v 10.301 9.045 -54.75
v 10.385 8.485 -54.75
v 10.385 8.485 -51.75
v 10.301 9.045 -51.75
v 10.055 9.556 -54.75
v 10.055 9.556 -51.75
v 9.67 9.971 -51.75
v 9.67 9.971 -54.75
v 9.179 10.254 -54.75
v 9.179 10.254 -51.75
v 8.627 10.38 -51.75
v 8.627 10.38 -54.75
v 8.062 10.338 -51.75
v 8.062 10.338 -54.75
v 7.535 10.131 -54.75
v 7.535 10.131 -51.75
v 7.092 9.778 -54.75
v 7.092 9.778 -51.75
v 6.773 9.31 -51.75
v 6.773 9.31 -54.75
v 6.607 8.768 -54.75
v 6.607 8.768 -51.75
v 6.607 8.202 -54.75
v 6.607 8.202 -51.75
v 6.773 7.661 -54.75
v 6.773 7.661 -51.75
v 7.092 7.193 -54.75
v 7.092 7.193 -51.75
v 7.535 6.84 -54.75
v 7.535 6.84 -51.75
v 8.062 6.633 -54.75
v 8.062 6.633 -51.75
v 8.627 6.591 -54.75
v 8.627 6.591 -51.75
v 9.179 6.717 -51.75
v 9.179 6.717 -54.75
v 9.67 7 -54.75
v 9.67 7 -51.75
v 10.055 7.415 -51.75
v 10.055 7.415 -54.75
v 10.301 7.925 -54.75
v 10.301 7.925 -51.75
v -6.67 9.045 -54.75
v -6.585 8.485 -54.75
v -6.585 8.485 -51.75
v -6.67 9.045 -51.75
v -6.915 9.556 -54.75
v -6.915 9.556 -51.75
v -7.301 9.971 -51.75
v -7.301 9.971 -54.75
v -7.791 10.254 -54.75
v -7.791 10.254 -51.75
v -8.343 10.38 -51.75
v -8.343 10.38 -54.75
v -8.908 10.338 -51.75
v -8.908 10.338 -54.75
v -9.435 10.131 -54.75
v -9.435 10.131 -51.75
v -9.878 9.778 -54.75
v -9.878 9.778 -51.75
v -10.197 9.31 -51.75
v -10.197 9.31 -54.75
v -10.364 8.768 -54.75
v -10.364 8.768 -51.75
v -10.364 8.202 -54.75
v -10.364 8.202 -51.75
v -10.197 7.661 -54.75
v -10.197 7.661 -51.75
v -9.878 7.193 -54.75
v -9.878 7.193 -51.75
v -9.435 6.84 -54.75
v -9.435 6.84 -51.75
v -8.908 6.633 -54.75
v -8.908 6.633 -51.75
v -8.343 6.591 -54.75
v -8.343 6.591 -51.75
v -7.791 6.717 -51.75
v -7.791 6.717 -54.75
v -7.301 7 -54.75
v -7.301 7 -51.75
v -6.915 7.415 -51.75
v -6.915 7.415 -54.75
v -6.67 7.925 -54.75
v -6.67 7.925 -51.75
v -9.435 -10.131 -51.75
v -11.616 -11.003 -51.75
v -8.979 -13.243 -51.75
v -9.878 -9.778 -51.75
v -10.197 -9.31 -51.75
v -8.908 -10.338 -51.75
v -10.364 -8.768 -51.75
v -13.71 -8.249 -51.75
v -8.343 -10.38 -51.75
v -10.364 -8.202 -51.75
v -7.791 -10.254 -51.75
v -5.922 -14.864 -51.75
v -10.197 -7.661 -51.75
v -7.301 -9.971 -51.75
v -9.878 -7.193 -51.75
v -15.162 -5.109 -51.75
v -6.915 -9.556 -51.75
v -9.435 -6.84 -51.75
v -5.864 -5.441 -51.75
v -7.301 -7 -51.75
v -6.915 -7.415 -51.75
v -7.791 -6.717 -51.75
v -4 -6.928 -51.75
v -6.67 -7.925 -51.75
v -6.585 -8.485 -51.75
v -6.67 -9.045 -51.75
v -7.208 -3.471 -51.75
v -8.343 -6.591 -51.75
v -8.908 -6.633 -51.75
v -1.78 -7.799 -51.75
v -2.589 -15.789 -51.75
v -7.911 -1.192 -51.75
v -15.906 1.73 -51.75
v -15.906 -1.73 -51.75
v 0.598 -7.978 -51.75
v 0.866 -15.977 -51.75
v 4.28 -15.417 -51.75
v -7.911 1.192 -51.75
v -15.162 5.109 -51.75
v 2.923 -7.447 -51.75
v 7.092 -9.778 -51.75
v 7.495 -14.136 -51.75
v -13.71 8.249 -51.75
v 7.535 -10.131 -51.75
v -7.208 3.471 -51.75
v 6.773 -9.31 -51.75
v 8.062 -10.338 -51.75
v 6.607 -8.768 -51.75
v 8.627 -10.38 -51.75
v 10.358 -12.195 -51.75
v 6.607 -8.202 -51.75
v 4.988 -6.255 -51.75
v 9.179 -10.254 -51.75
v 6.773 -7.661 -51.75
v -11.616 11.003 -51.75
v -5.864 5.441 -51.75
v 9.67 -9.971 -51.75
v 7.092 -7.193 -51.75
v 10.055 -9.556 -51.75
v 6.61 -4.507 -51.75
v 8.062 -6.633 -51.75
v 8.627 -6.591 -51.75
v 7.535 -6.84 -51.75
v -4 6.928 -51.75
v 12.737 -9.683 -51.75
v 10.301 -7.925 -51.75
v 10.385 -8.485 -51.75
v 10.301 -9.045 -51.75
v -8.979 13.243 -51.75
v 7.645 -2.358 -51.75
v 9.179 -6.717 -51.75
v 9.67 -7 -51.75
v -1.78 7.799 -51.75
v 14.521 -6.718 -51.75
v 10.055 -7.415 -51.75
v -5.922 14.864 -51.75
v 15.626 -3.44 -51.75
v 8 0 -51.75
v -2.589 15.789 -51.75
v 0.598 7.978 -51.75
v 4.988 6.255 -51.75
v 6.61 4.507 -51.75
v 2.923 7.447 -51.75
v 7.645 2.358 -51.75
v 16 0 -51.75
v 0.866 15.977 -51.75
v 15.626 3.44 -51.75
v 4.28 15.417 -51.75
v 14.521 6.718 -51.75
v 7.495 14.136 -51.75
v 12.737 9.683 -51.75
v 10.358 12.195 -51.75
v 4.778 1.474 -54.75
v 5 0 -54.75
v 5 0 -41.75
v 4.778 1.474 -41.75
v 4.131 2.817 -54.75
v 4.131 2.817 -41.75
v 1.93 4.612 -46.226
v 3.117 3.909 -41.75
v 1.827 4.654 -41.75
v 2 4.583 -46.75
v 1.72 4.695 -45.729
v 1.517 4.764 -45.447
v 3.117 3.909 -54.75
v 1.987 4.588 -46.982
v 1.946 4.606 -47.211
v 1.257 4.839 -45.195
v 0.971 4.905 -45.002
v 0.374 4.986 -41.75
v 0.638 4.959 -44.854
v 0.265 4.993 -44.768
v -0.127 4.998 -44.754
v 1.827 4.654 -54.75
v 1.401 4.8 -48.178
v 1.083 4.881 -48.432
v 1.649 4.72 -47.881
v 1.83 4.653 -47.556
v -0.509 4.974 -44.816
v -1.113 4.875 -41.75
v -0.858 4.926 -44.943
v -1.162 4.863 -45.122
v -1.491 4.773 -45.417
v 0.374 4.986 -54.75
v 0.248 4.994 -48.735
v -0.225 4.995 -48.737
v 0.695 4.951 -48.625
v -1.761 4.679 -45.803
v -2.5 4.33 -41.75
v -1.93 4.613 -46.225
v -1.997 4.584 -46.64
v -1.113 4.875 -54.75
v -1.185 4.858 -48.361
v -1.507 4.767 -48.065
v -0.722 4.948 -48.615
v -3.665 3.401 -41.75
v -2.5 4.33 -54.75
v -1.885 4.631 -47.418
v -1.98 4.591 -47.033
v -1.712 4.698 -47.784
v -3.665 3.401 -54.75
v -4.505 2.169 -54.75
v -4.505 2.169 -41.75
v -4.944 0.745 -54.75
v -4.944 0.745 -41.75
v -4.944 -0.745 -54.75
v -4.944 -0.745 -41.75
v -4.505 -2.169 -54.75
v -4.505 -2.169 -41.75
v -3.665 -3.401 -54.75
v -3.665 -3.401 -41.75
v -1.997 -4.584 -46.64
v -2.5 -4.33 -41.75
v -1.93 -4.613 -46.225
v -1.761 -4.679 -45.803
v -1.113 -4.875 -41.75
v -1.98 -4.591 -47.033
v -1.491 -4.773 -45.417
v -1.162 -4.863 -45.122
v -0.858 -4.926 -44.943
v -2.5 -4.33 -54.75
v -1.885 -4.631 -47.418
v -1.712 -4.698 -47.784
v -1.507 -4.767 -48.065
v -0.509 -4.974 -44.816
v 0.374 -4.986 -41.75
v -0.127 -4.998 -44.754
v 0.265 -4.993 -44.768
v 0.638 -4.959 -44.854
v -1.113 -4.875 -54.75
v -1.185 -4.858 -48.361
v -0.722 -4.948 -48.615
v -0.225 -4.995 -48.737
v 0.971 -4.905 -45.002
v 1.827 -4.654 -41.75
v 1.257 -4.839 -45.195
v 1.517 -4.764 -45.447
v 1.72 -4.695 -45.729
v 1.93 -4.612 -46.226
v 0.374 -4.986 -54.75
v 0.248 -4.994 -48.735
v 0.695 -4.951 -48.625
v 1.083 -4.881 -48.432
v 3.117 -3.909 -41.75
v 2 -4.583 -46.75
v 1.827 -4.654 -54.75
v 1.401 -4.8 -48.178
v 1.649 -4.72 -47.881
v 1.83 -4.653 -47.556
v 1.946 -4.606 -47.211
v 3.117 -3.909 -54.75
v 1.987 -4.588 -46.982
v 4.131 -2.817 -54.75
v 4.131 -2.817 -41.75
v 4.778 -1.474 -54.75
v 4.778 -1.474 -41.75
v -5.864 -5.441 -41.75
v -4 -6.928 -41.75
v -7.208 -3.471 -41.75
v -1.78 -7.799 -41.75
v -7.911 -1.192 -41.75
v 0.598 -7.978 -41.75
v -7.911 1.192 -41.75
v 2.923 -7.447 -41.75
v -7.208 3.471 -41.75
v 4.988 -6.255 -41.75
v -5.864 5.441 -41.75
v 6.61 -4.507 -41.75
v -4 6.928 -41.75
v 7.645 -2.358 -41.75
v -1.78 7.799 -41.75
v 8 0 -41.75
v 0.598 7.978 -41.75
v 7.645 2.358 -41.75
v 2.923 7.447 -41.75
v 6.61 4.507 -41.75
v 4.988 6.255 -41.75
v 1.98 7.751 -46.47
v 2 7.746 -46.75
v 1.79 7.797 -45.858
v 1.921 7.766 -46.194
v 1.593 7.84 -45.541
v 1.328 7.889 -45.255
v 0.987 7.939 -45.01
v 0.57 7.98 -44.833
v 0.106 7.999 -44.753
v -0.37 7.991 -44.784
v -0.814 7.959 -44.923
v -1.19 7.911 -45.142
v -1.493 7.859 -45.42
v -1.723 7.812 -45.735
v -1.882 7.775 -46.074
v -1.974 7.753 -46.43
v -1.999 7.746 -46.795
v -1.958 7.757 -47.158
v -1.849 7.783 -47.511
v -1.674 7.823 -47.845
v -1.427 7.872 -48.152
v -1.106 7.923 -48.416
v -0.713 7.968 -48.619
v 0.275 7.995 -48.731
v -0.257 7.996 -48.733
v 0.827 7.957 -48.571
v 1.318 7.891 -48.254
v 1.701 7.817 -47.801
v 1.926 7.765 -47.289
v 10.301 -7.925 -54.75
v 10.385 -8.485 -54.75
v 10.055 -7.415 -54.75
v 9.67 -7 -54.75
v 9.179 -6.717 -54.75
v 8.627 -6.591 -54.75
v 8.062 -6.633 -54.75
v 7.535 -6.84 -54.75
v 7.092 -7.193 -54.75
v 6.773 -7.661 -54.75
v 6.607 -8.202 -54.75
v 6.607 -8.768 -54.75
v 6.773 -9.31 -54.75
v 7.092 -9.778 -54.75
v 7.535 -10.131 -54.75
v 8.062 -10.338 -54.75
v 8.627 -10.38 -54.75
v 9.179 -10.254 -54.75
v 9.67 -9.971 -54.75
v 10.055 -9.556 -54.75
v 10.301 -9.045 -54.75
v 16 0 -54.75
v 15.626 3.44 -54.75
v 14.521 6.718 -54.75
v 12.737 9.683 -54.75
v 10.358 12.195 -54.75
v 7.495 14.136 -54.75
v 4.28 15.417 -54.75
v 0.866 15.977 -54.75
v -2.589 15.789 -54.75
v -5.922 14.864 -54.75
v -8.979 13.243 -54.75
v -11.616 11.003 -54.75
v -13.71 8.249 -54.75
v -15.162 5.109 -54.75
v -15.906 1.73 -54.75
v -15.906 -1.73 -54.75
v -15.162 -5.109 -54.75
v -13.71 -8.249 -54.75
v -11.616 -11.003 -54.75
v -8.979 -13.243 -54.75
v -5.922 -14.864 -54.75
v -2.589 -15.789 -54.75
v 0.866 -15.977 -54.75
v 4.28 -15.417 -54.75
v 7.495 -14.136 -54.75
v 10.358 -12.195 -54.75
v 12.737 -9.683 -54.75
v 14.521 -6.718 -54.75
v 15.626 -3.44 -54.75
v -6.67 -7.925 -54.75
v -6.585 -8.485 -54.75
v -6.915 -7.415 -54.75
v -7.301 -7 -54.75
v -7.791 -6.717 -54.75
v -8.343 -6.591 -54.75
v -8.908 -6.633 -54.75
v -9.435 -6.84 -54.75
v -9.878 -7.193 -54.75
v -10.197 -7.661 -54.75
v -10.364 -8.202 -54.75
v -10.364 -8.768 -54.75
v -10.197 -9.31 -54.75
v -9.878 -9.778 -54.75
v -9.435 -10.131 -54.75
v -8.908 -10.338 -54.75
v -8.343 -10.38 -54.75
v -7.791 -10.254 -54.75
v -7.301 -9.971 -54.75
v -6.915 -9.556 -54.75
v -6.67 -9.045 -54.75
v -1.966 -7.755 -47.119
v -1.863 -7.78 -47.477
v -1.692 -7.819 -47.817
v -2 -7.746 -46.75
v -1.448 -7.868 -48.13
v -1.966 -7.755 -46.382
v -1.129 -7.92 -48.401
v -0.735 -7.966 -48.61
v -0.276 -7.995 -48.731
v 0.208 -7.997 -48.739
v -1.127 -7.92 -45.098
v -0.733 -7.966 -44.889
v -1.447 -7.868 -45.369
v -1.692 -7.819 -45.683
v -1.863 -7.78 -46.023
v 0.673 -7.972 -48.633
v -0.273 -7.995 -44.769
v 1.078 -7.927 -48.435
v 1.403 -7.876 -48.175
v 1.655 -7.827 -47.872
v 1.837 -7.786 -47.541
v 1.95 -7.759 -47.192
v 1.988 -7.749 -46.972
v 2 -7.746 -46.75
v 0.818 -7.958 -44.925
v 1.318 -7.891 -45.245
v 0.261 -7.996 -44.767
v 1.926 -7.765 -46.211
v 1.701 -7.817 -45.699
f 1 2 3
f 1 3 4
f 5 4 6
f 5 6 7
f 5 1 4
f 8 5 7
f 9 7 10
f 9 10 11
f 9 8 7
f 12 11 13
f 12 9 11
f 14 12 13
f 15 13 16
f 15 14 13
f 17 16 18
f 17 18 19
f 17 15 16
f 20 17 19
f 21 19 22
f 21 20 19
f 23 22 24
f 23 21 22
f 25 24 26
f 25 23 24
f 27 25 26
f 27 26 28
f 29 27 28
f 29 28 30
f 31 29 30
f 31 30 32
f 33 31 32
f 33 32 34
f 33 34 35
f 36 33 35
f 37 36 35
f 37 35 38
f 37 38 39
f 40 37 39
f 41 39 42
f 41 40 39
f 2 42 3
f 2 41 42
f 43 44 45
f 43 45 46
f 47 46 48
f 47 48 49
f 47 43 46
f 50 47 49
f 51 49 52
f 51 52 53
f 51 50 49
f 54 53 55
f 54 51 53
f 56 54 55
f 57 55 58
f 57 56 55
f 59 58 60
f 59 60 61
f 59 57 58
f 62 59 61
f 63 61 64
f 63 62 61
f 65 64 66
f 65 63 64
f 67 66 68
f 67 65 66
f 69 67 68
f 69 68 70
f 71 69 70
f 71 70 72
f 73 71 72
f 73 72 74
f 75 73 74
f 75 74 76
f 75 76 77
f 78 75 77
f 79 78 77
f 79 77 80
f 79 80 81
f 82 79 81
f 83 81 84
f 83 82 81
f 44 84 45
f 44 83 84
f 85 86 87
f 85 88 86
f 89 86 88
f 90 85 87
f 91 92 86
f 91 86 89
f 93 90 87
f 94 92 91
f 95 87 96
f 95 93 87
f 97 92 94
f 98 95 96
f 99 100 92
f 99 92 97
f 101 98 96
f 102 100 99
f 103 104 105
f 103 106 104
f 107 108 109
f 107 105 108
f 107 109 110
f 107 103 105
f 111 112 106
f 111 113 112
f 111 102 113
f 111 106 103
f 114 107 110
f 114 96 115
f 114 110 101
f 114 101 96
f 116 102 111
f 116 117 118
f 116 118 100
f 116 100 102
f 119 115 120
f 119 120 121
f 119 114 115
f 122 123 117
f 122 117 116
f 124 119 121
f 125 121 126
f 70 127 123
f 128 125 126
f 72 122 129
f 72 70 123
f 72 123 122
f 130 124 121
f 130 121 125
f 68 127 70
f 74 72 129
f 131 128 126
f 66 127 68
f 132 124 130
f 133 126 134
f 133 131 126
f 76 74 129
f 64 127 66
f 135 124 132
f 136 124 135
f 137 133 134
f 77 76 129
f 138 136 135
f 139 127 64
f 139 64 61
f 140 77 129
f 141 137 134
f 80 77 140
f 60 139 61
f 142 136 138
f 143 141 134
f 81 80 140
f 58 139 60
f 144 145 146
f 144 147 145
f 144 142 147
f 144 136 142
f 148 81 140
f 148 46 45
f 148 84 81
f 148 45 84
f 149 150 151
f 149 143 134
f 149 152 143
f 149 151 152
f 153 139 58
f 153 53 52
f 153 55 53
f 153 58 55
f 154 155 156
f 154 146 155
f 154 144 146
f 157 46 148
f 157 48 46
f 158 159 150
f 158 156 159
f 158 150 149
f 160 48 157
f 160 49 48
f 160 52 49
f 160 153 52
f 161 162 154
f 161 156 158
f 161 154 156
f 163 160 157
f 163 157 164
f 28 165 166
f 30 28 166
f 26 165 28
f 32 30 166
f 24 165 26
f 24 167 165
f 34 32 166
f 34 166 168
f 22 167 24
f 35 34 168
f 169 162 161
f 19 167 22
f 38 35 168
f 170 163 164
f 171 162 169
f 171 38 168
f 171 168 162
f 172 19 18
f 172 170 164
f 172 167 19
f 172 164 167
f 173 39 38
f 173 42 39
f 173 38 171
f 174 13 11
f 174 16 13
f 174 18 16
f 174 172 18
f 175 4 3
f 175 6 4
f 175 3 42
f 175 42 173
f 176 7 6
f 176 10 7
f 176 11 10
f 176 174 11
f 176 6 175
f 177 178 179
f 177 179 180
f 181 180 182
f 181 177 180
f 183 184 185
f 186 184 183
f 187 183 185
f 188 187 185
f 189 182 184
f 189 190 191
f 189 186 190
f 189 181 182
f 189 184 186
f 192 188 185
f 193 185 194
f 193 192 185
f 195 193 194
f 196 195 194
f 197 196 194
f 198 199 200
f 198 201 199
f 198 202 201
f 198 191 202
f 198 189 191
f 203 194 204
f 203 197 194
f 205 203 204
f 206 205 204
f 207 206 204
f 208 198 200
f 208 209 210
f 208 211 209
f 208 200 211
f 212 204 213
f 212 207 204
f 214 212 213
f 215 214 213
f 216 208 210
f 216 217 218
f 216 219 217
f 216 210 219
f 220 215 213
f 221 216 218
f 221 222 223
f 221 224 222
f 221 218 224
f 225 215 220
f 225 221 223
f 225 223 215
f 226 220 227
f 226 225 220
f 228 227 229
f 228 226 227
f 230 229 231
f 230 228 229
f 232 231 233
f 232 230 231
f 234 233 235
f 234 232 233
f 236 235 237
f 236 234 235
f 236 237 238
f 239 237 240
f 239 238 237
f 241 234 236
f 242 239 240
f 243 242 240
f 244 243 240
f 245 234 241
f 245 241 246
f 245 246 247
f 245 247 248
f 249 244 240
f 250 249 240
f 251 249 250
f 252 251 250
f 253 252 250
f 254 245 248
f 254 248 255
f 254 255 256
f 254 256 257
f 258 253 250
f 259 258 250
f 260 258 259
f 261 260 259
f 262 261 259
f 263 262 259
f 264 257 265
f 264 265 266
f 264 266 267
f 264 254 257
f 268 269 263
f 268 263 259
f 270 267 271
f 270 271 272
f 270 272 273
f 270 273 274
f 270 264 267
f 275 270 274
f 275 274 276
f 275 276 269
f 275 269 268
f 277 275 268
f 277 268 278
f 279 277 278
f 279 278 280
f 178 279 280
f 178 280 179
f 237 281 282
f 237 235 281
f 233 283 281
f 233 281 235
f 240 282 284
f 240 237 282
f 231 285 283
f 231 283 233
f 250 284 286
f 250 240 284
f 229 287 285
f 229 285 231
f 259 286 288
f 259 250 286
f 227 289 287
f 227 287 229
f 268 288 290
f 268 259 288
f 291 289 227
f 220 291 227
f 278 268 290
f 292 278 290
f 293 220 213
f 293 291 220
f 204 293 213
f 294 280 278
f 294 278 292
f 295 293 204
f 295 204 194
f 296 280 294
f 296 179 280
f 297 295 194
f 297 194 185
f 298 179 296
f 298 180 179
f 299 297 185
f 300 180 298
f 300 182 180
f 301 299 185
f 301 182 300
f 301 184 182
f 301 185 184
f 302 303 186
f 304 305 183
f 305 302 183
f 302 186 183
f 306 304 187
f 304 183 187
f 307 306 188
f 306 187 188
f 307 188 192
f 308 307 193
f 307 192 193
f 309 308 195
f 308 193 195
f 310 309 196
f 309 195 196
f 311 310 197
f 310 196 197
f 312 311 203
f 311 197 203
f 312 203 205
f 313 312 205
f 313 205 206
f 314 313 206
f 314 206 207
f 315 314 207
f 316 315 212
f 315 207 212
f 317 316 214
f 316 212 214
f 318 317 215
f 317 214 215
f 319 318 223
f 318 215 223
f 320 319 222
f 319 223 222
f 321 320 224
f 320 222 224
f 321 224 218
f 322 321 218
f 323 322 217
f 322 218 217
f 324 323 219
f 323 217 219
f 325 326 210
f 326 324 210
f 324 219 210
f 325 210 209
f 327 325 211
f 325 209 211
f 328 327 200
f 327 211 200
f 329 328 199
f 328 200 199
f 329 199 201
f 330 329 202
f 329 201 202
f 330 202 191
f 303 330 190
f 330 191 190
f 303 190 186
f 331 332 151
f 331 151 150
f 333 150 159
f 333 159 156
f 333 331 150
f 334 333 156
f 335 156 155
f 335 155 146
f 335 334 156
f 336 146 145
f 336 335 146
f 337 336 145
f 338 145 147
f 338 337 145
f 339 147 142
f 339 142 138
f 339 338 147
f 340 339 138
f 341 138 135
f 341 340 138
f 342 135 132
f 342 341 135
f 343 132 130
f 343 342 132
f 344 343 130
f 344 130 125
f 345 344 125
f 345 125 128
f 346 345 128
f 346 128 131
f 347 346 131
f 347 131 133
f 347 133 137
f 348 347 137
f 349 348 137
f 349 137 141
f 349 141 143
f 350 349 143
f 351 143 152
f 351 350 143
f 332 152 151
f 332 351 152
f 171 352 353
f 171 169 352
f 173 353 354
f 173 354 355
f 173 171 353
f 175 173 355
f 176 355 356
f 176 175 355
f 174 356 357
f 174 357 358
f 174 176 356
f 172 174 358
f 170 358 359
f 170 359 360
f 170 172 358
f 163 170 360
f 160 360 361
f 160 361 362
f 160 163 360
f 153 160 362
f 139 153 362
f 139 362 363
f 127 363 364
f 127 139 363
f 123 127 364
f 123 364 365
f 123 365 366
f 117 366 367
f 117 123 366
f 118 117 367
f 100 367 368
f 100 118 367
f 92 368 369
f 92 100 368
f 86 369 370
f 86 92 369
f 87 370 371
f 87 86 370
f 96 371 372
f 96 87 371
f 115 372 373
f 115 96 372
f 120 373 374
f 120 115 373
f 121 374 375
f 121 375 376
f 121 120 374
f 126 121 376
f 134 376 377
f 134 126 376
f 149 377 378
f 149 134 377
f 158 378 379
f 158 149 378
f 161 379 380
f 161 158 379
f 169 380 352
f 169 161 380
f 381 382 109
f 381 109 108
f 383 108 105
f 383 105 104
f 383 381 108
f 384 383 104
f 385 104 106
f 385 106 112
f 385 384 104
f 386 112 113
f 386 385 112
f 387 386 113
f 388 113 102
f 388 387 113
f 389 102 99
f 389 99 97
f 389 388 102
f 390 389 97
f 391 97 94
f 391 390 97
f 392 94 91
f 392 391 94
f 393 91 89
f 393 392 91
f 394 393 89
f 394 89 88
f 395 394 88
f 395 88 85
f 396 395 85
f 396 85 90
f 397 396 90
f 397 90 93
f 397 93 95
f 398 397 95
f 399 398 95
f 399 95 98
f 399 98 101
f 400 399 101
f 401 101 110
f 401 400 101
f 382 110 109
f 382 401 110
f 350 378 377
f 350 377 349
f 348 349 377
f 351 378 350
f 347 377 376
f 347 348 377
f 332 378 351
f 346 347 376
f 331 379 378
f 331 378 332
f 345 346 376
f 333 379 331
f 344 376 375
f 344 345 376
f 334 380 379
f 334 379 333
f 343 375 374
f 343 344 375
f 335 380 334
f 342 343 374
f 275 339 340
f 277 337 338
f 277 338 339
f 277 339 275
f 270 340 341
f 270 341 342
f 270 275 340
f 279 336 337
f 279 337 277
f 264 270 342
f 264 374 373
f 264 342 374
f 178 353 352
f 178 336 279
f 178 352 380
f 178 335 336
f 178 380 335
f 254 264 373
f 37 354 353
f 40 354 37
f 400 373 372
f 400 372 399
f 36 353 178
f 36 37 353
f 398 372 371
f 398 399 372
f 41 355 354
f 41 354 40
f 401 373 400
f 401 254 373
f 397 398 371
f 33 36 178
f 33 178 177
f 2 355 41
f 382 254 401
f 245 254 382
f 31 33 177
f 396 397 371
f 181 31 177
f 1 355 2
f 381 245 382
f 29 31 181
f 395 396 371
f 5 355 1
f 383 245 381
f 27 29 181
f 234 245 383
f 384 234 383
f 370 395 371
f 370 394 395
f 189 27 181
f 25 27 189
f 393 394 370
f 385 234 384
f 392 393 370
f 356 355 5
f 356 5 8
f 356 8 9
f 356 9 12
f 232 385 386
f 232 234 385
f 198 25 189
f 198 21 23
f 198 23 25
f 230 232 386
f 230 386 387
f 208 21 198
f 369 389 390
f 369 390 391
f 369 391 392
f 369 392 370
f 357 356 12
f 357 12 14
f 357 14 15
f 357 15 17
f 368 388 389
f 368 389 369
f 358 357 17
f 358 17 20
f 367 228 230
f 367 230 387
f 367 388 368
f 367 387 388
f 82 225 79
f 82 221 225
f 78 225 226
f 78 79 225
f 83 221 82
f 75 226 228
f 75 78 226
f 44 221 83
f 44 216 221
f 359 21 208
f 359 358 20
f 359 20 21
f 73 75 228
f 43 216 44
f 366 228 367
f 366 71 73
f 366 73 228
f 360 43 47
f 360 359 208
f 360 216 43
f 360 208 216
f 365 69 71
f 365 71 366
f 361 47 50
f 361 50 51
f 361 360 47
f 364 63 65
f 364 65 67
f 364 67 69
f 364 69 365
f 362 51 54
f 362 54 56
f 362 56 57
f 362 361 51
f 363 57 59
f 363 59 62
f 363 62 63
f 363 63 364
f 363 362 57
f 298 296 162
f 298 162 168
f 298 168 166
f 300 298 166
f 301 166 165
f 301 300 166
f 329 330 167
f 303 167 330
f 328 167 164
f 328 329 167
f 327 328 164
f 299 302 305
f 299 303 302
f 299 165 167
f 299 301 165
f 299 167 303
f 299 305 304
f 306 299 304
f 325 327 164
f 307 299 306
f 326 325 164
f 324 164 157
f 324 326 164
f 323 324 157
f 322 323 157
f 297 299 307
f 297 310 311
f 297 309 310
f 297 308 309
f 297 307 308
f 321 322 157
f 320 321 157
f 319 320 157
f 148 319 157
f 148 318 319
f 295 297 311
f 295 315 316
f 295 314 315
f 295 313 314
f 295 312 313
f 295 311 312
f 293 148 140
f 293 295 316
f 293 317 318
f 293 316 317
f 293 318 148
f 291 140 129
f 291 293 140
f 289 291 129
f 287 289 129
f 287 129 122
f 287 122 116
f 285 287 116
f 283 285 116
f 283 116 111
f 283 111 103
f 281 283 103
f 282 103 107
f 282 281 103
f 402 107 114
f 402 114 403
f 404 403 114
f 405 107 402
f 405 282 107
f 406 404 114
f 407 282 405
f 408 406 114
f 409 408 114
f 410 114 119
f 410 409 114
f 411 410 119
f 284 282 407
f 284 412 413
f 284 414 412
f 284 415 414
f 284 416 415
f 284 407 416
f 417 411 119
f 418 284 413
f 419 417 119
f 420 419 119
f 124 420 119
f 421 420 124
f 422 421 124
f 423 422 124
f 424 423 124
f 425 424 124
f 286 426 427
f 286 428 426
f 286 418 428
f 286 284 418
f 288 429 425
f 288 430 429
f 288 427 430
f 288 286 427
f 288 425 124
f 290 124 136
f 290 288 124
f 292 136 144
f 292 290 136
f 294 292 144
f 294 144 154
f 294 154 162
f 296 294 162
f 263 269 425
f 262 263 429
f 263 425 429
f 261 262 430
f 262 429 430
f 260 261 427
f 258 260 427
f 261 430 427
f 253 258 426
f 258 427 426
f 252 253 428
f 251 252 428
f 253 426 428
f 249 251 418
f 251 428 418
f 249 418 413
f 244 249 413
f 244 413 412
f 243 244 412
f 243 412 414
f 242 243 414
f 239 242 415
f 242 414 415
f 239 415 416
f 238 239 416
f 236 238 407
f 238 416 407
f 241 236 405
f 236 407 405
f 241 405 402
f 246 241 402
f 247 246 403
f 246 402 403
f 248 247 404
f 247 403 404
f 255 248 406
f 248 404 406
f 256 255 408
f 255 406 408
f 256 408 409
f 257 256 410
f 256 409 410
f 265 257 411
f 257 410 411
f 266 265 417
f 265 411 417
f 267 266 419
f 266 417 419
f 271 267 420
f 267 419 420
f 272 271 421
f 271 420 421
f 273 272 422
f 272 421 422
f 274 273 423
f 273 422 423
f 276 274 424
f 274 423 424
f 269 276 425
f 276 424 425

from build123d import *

# Parameters (mm, degrees)
SKETCH064_R     = 1.9
POCKET002_DEPTH = 3
SKETCH065_R     = 2
POCKET003_DEPTH = 8


with BuildPart() as part:
    # Sketch063 → Revolution002 (revolve)
    with BuildSketch(Plane.XZ):
        Polygon((5, 13), (5, 0), (16, 0), (16, 3), (8, 3), (8, 13), align=None)
    revolve(axis=Axis((0, 0, 0), (0, 0, 1)))

    # Sketch064 → Pocket002 (cut)
    with BuildSketch(Plane.XY):
        with Locations((-8.485281, 8.485281)):
            Circle(SKETCH064_R)
        with Locations((8.485281, 8.485281)):
            Circle(SKETCH064_R)
        with Locations((8.485281, -8.485281)):
            Circle(SKETCH064_R)
        with Locations((-8.485281, -8.485281)):
            Circle(SKETCH064_R)
    extrude(amount=POCKET002_DEPTH, mode=Mode.SUBTRACT)

    # Sketch065 → Pocket003 (cut, symmetric)
    with BuildSketch(Plane.XZ):
        with Locations((0, 8)):
            Circle(SKETCH065_R)
    extrude(amount=POCKET003_DEPTH, both=True, mode=Mode.SUBTRACT)


with BuildPart() as part_1:
    # Body003 placement: moved
    add(part.part.moved(Location((0, 0, -54.75))))


solid = part_1.part
